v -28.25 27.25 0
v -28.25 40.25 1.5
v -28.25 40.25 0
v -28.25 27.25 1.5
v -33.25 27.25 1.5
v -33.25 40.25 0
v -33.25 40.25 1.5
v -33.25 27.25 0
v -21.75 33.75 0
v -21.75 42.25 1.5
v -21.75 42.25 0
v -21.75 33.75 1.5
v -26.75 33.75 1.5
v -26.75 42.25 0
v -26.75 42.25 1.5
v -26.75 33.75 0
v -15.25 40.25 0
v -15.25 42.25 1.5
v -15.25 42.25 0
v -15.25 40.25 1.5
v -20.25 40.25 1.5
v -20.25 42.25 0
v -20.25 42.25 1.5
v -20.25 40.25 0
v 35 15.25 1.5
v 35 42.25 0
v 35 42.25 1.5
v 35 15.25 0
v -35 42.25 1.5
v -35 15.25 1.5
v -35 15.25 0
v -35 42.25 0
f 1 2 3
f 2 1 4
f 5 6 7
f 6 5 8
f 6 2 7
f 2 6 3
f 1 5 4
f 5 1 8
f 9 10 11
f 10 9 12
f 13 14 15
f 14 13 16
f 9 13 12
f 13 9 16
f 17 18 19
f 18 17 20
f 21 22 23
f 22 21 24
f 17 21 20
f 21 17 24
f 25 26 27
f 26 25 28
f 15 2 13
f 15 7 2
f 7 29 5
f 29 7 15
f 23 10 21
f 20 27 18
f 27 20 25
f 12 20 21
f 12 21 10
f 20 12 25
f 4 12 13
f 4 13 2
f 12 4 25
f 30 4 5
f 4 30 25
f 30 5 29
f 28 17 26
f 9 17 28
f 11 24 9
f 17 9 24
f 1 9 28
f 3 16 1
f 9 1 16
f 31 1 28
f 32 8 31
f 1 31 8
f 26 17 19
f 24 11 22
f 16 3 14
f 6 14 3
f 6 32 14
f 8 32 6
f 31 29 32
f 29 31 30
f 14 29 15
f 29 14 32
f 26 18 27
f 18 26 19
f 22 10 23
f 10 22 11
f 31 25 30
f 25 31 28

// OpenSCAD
// 10-well comb for casting agarose gels, printed lying flat
// Units: mm. Plate thickness (Z) = 1.5 mm.

// ---------- Parameters ----------
spine_len      = 70;    // spine (back bar) length along X
spine_wid      = 12;    // spine width along Y
plate_thk      = 1.5;   // plate thickness along Z

tooth_count    = 10;    // number of teeth
tooth_w        = 5.0;   // tooth width along X
tooth_l        = 12;    // tooth length along Y (hangs in -Y)
tooth_gap      = 1.5;   // gap between neighbouring teeth along X

eps            = 0.5;   // overcut so cutters pass through faces
$fn            = 64;    // circle resolution (no curves here, set per rules)

// ---------- Derived ----------
row_wid        = tooth_count * tooth_w + (tooth_count + 1) * tooth_gap; // 57.5 mm
y0             = -spine_wid / 2 + row_wid / 2;                          // first tooth Y (centres row)

// ---------- Model ----------
difference() {
    // Base plate: spine + teeth, centred on origin in X and Y
    translate([-spine_len / 2, y0 - tooth_l, 0])
        cube([spine_len, spine_wid + tooth_l + 2 * tooth_gap, plate_thk]);

    // Cut out the 10 wells (through the full plate thickness)
    for (i = [0 : tooth_count - 1]) {
        x = -row_wid / 2 + i * (tooth_w + tooth_gap);
        translate([x, y0 + i * (tooth_w + tooth_gap), -eps])
            cube([tooth_w, tooth_l + 2 * eps, plate_thk + 2 * eps]);
    }
}
